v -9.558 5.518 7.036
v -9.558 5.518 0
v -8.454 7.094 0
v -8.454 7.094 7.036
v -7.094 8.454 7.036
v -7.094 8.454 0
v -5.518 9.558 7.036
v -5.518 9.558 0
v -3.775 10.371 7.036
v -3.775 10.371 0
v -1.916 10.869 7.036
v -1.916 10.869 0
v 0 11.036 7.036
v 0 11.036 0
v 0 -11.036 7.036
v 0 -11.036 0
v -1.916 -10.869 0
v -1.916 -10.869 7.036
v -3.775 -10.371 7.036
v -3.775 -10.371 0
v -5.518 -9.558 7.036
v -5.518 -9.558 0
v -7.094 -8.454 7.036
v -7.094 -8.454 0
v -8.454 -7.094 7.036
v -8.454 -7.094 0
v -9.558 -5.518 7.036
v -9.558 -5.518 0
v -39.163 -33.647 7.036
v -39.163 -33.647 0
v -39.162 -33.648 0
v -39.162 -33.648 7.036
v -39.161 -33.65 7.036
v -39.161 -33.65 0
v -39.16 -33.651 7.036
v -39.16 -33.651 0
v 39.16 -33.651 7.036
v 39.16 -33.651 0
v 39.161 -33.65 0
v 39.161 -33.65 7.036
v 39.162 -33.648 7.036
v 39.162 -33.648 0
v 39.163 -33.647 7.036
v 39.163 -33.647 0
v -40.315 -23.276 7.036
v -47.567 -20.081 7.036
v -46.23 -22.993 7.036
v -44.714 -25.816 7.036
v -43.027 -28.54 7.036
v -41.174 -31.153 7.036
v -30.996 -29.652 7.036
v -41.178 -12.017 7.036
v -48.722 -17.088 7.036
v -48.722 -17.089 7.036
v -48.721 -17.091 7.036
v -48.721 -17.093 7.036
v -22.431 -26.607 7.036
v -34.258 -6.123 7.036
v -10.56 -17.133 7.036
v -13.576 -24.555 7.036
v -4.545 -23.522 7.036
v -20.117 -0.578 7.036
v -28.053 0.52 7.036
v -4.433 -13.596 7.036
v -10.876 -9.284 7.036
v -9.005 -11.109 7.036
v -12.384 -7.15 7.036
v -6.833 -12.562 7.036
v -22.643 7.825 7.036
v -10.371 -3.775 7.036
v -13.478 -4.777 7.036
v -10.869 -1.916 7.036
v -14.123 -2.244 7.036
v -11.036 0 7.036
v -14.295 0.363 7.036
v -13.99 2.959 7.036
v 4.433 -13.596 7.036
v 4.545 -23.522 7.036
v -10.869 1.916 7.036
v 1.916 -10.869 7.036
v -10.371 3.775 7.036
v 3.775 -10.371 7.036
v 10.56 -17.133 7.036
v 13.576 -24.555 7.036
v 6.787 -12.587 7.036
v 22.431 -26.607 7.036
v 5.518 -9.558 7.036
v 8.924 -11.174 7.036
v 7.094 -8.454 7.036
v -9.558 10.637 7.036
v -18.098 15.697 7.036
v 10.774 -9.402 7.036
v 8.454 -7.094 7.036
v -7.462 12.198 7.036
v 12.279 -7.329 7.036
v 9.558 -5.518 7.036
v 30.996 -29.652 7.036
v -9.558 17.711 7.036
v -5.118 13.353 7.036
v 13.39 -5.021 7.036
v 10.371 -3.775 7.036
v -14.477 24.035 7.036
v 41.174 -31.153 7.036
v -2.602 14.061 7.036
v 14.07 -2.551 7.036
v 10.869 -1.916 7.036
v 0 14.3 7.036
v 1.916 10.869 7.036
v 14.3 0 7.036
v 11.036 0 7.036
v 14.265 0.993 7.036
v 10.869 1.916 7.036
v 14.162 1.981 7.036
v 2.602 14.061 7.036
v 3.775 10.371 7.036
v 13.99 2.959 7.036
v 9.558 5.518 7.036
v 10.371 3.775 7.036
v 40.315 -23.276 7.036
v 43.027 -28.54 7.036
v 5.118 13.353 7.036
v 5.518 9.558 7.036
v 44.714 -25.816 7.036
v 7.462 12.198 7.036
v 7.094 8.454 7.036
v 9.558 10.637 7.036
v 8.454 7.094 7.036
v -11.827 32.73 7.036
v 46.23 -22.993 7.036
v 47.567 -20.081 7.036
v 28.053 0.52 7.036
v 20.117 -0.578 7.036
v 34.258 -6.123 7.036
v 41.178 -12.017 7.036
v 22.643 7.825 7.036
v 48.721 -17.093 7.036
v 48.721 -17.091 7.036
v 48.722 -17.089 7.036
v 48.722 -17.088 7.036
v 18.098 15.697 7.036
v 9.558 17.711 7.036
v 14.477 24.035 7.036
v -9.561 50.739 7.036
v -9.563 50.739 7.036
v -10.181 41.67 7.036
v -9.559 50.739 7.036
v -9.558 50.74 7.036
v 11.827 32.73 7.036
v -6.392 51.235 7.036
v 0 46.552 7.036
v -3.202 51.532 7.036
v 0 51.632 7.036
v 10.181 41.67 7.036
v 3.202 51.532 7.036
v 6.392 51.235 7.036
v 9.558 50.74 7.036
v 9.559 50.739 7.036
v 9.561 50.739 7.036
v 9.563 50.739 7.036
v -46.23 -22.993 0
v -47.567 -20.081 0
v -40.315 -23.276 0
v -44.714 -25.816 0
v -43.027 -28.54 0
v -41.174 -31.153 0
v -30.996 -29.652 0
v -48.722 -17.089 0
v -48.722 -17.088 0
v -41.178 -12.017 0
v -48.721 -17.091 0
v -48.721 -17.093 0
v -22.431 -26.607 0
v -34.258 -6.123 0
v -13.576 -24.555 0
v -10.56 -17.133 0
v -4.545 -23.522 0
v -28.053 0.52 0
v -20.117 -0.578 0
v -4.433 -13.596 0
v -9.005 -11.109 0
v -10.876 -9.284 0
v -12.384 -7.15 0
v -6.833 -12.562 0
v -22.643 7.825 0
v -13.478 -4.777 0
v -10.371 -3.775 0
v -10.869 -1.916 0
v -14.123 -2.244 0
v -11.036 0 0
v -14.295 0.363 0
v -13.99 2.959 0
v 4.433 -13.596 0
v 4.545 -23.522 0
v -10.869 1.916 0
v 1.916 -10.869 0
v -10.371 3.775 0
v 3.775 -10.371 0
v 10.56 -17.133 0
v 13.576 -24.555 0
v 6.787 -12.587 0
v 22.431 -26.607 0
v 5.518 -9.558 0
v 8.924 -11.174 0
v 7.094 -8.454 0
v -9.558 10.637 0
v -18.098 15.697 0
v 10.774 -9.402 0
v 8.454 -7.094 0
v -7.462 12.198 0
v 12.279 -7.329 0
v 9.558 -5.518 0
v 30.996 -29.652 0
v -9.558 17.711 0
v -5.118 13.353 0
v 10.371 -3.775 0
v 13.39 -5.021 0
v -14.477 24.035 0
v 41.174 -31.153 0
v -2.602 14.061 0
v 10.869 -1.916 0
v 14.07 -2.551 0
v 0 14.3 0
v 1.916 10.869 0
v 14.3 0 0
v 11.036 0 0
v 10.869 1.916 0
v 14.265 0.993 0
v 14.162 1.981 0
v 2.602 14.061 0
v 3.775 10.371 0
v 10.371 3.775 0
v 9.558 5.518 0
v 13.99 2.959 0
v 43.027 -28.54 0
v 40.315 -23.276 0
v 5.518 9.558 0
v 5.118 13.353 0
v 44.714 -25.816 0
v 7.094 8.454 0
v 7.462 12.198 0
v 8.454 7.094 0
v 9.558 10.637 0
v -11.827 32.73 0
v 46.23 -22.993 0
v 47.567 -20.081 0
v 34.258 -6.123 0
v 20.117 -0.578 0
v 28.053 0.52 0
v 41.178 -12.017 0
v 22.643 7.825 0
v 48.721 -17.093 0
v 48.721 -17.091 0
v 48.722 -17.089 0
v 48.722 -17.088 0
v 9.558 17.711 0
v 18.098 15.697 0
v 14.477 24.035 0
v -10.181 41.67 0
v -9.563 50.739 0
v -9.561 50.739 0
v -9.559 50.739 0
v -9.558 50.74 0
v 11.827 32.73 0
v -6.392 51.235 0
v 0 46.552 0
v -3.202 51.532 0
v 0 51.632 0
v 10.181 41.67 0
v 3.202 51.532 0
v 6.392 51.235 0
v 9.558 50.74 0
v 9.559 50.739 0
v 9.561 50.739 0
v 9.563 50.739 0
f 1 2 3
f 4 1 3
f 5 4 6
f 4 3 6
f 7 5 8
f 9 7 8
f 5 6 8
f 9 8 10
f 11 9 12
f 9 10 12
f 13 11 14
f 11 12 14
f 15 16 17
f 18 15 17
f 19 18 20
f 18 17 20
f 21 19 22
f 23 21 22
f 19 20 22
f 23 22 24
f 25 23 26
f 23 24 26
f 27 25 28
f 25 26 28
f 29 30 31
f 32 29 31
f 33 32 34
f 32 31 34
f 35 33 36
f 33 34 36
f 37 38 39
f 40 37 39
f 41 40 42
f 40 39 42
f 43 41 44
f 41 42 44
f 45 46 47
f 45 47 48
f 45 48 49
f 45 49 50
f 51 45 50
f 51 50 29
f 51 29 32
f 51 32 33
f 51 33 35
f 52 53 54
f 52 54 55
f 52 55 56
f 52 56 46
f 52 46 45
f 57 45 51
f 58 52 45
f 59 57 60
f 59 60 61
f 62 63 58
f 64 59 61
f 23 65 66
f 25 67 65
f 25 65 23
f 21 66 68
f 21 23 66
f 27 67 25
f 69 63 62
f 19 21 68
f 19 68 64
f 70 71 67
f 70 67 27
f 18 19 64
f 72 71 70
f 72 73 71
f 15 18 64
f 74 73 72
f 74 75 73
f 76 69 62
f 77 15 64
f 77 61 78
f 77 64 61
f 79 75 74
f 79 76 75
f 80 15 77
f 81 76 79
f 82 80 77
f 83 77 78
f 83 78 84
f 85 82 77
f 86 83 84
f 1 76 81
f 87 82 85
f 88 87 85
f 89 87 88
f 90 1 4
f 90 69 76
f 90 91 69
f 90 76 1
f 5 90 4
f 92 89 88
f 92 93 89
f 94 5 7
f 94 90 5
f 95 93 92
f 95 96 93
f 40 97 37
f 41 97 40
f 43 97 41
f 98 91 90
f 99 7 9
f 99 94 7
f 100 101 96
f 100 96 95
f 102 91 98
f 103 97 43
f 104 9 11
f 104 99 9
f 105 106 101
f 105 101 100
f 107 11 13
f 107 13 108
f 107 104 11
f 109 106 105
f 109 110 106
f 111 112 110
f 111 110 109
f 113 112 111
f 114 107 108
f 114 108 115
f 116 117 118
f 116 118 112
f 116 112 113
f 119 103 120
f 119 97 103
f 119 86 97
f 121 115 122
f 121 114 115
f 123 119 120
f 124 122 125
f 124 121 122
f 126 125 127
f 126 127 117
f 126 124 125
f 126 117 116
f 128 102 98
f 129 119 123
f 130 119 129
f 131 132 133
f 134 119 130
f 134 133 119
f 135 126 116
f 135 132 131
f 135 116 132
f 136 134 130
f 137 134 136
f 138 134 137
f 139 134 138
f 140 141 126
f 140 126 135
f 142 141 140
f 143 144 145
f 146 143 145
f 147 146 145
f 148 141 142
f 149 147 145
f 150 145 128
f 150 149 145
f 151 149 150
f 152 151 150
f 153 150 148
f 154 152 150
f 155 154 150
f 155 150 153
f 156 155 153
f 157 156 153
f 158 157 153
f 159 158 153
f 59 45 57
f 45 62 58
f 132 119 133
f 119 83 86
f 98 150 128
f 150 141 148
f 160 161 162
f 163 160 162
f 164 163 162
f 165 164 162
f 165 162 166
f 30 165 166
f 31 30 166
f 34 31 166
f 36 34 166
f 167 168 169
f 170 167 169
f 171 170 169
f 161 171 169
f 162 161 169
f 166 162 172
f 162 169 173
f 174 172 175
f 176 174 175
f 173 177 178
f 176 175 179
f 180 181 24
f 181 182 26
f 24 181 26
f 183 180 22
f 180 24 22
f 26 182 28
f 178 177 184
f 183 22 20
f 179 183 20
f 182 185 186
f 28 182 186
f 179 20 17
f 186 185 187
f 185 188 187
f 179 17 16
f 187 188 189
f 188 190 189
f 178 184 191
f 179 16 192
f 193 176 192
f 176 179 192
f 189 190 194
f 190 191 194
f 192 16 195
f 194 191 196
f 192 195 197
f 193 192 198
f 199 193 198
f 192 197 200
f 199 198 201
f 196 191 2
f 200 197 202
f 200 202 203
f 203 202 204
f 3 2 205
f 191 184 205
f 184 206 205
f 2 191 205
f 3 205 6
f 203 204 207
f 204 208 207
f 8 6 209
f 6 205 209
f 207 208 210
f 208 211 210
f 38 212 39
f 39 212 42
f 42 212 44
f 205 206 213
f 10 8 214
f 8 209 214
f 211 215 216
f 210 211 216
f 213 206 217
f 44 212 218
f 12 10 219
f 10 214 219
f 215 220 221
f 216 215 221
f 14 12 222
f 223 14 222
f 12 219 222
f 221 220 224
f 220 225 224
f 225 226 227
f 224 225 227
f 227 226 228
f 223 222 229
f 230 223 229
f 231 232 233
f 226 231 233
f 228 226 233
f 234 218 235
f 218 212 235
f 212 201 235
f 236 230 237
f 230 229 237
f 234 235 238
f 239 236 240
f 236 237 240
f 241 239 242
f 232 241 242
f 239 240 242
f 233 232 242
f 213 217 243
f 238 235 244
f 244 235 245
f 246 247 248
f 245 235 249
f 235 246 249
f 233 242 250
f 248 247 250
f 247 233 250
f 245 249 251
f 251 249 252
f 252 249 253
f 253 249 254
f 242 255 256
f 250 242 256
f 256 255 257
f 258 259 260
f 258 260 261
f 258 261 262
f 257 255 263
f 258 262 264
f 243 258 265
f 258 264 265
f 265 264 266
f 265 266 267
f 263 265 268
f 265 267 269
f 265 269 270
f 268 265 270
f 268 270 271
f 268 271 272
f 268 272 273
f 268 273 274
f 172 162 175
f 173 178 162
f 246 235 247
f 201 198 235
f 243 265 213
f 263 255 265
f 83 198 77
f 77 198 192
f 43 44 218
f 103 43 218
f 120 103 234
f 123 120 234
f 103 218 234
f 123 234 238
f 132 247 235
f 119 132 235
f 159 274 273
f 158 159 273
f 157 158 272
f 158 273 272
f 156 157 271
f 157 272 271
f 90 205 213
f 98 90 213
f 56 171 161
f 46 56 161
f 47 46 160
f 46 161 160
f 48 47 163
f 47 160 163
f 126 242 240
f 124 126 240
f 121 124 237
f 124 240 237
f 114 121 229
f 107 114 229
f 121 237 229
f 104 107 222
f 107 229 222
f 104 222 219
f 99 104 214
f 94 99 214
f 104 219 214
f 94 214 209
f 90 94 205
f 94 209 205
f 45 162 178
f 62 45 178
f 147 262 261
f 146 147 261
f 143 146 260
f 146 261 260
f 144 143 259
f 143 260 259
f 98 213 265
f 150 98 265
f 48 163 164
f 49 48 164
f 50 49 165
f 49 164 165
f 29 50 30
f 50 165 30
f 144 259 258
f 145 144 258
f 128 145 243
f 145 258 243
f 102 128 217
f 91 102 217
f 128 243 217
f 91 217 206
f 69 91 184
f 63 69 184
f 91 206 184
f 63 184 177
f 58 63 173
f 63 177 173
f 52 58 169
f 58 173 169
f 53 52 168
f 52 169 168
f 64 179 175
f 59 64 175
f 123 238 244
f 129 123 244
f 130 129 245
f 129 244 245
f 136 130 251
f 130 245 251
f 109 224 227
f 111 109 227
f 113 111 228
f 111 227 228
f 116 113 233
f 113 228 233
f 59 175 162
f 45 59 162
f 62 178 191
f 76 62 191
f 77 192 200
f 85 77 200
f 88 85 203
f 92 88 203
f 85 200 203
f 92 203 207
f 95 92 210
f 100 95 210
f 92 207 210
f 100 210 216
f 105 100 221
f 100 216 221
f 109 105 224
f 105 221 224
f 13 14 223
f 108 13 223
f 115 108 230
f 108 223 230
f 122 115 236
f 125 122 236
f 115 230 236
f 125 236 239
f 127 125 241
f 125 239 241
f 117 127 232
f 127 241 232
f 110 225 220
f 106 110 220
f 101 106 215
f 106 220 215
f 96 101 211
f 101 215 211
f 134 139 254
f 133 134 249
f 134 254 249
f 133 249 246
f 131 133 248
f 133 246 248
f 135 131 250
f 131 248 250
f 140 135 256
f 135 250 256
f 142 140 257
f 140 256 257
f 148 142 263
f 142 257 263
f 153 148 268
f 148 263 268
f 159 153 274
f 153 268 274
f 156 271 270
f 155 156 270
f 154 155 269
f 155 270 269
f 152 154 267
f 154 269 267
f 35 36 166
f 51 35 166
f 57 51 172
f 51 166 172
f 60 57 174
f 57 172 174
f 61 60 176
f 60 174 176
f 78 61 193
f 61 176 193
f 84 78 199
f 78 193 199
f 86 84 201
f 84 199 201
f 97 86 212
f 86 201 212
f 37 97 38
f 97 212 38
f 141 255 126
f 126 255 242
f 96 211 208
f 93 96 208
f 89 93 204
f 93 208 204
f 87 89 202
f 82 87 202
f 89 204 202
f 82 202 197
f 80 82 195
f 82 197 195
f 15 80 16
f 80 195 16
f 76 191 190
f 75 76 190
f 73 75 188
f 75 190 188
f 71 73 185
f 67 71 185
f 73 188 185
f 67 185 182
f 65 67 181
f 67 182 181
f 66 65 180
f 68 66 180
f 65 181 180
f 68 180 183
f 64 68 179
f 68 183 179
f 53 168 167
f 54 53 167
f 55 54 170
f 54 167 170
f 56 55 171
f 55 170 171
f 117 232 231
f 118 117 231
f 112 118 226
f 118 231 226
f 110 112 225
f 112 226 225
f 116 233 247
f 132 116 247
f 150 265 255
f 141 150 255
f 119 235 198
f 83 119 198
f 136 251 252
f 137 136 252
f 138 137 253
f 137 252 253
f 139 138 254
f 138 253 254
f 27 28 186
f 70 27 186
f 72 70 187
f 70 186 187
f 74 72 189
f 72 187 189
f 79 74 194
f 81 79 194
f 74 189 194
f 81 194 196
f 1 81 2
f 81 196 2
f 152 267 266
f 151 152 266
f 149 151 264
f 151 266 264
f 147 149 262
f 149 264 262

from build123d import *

# Parameters (mm, degrees)
F1_DEPTH = 7.0358


with BuildPart() as f1:
    # F0 (on Top) → F1 (new body)
    with BuildSketch(Plane.XY):
        with BuildLine():
            Line((-9.5577161638, 50.7395111935), (-9.5577161638, 17.7112849253))
            Line((-9.5577161638, 17.7112849253), (0, 46.55185))
            Line((0, 46.55185), (0, 51.63185))
            ThreePointArc((0, 51.63185), (-4.799640789, 51.408281266), (-9.5577161638, 50.7395111935))
        make_face()
        with BuildLine():
            Line((0, 46.55185), (9.5577161638, 17.7112849253))
            Line((9.5577161638, 17.7112849253), (9.5577161638, 50.7395111935))
            ThreePointArc((9.5577161638, 50.7395111935), (4.799640789, 51.408281266), (0, 51.63185))
            Line((0, 51.63185), (0, 46.55185))
        make_face()
        with BuildLine():
            Line((9.5577161638, 17.7112849253), (9.5577161638, 10.636620877))
            ThreePointArc((9.5577161638, 10.636620877), (12.3840918707, 7.1499587752), (13.9904419718, 2.9589145615))
            Line((13.9904419718, 2.9589145615), (20.1172807609, -0.5784174627))
            ThreePointArc((20.1172807609, -0.5784174627), (20.1235159205, -0.2892386033), (20.1255944502, 0))
            ThreePointArc((20.1255944502, 0), (17.282856699, 10.3122459385), (9.5577161638, 17.7112849253))
        make_face()
        with BuildLine():
            Line((10.5595645971, -17.1328674627), (4.432725808, -13.5955354385))
            ThreePointArc((4.432725808, -13.5955354385), (0, -14.2999175504), (-4.432725808, -13.5955354385))
            Line((-4.432725808, -13.5955354385), (-10.5595645971, -17.1328674627))
            ThreePointArc((-10.5595645971, -17.1328674627), (0, -20.1255944502), (10.5595645971, -17.1328674627))
        make_face()
        with BuildLine():
            Line((-20.1172807609, -0.5784174627), (-13.9904419718, 2.9589145615))
            ThreePointArc((-13.9904419718, 2.9589145615), (-12.3840918707, 7.1499587752), (-9.5577161638, 10.636620877))
            Line((-9.5577161638, 10.636620877), (-9.5577161638, 17.7112849253))
            ThreePointArc((-9.5577161638, 17.7112849253), (-17.4292760601, 10.0627972251), (-20.1172807609, -0.5784174627))
        make_face()
        with BuildLine():
            Line((-48.7205637511, -17.0925305967), (-20.1172807609, -0.5784174627))
            ThreePointArc((-20.1172807609, -0.5784174627), (-17.4292760601, 10.0627972251), (-9.5577161638, 17.7112849253))
            Line((-9.5577161638, 17.7112849253), (-9.5577161638, 50.7395111935))
            ThreePointArc((-9.5577161638, 50.7395111935), (-9.5602138637, 50.7390406423), (-9.5627115404, 50.7385699682))
            ThreePointArc((-9.5627115404, 50.7385699682), (-20.2584374888, 11.6962143375), (-48.7222463144, -17.087733861))
            ThreePointArc((-48.7222463144, -17.087733861), (-48.7214050917, -17.0901322496), (-48.7205637511, -17.0925305967))
        make_face()
        with BuildLine():
            Line((9.5577161638, 50.7395111935), (9.5577161638, 17.7112849253))
            ThreePointArc((9.5577161638, 17.7112849253), (17.282856699, 10.3122459385), (20.1255944502, 0))
            ThreePointArc((20.1255944502, 0), (20.1235159205, -0.2892386033), (20.1172807609, -0.5784174627))
            Line((20.1172807609, -0.5784174627), (45.0939427751, -14.9987))
            Line((45.0939427751, -14.9987), (48.7205637511, -17.0925305967))
            ThreePointArc((48.7205637511, -17.0925305967), (48.7214050917, -17.0901322496), (48.7222463144, -17.087733861))
            ThreePointArc((48.7222463144, -17.087733861), (20.2584374888, 11.6962143375), (9.5627115404, 50.7385699682))
            ThreePointArc((9.5627115404, 50.7385699682), (9.5602138637, 50.7390406423), (9.5577161638, 50.7395111935))
        make_face()
        with BuildLine():
            Line((35.5362266113, -31.55315), (10.5595645971, -17.1328674627))
            ThreePointArc((10.5595645971, -17.1328674627), (0, -20.1255944502), (-10.5595645971, -17.1328674627))
            Line((-10.5595645971, -17.1328674627), (-39.1628475873, -33.6469805967))
            ThreePointArc((-39.1628475873, -33.6469805967), (-39.1611912281, -33.6489083927), (-39.1595347739, -33.6508361072))
            ThreePointArc((-39.1595347739, -33.6508361072), (0, -23.392428675), (39.1595347739, -33.6508361072))
            ThreePointArc((39.1595347739, -33.6508361072), (39.1611912281, -33.6489083927), (39.1628475873, -33.6469805967))
            Line((39.1628475873, -33.6469805967), (35.5362266113, -31.55315))
        make_face()
        with BuildLine():
            Line((-39.1628475873, -33.6469805967), (-10.5595645971, -17.1328674627))
            Line((-10.5595645971, -17.1328674627), (-40.3150846932, -23.275925))
            Line((-40.3150846932, -23.275925), (-44.7144937444, -25.815925))
            ThreePointArc((-44.7144937444, -25.815925), (-42.1210571467, -29.8607514853), (-39.1628475873, -33.6469805967))
        make_face()
        with BuildLine():
            Line((-40.3150846932, -23.275925), (-20.1172807609, -0.5784174627))
            Line((-20.1172807609, -0.5784174627), (-48.7205637511, -17.0925305967))
            ThreePointArc((-48.7205637511, -17.0925305967), (-46.9206979357, -21.5475297807), (-44.7144937444, -25.815925))
            Line((-44.7144937444, -25.815925), (-40.3150846932, -23.275925))
        make_face()
        Polygon((40.3150846932, -23.275925), (10.5595645971, -17.1328674627), (35.5362266113, -31.55315), (37.7359311369, -27.74315), align=None)
        Polygon((45.0939427751, -14.9987), (20.1172807609, -0.5784174627), (40.3150846932, -23.275925), (42.5539427751, -19.3981090512), align=None)
        with BuildLine():
            Line((-4.432725808, -13.5955354385), (0, -11.0363))
            ThreePointArc((0, -11.0363), (-5.51815, -9.5577161638), (-9.5577161638, -5.51815))
            ThreePointArc((-9.5577161638, -5.51815), (-11.0363, 0), (-9.5577161638, 5.51815))
            Line((-9.5577161638, 5.51815), (-13.9904419718, 2.9589145615))
            ThreePointArc((-13.9904419718, 2.9589145615), (-12.3840918707, -7.1499587752), (-4.432725808, -13.5955354385))
        make_face()
        with BuildLine():
            Line((-13.9904419718, 2.9589145615), (-9.5577161638, 5.51815))
            Line((-9.5577161638, 5.51815), (-9.5577161638, 10.636620877))
            ThreePointArc((-9.5577161638, 10.636620877), (-12.3840918707, 7.1499587752), (-13.9904419718, 2.9589145615))
        make_face()
        with BuildLine():
            ThreePointArc((0, 11.0363), (5.51815, 9.5577161638), (9.5577161638, 5.51815))
            Line((9.5577161638, 5.51815), (9.5577161638, 10.636620877))
            ThreePointArc((9.5577161638, 10.636620877), (0, 14.2999175504), (-9.5577161638, 10.636620877))
            Line((-9.5577161638, 10.636620877), (-9.5577161638, 5.51815))
            ThreePointArc((-9.5577161638, 5.51815), (-5.51815, 9.5577161638), (0, 11.0363))
        make_face()
        with BuildLine():
            Line((9.5577161638, 10.636620877), (9.5577161638, 5.51815))
            Line((9.5577161638, 5.51815), (13.9904419718, 2.9589145615))
            ThreePointArc((13.9904419718, 2.9589145615), (12.3840918707, 7.1499587752), (9.5577161638, 10.636620877))
        make_face()
        with BuildLine():
            ThreePointArc((11.0363, 0), (10.6602471967, -2.8564046275), (9.5577161638, -5.51815))
            ThreePointArc((9.5577161638, -5.51815), (5.51815, -9.5577161638), (0, -11.0363))
            Line((0, -11.0363), (4.432725808, -13.5955354385))
            ThreePointArc((4.432725808, -13.5955354385), (11.5731425189, -8.3994055852), (14.2999175504, 0))
            ThreePointArc((14.2999175504, 0), (14.2223382156, 1.487527354), (13.9904419718, 2.9589145615))
            Line((13.9904419718, 2.9589145615), (9.5577161638, 5.51815))
            ThreePointArc((9.5577161638, 5.51815), (10.6602471967, 2.8564046275), (11.0363, 0))
        make_face()
        with BuildLine():
            Line((4.432725808, -13.5955354385), (0, -11.0363))
            Line((0, -11.0363), (-4.432725808, -13.5955354385))
            ThreePointArc((-4.432725808, -13.5955354385), (0, -14.2999175504), (4.432725808, -13.5955354385))
        make_face()
        with BuildLine():
            Line((37.7359311369, -27.74315), (35.5362266113, -31.55315))
            Line((35.5362266113, -31.55315), (39.1628475873, -33.6469805967))
            ThreePointArc((39.1628475873, -33.6469805967), (42.1210570839, -29.8607515739), (44.7144936357, -25.8159251882))
            ThreePointArc((44.7144936357, -25.8159251882), (46.9206978904, -21.5475298794), (48.7205637511, -17.0925305967))
            Line((48.7205637511, -17.0925305967), (45.0939427751, -14.9987))
            Line((45.0939427751, -14.9987), (42.5539427751, -19.3981090512))
            Line((42.5539427751, -19.3981090512), (40.3150846932, -23.275925))
            Line((40.3150846932, -23.275925), (37.7359311369, -27.74315))
        make_face()
    extrude(amount=F1_DEPTH)


solid = f1.part
